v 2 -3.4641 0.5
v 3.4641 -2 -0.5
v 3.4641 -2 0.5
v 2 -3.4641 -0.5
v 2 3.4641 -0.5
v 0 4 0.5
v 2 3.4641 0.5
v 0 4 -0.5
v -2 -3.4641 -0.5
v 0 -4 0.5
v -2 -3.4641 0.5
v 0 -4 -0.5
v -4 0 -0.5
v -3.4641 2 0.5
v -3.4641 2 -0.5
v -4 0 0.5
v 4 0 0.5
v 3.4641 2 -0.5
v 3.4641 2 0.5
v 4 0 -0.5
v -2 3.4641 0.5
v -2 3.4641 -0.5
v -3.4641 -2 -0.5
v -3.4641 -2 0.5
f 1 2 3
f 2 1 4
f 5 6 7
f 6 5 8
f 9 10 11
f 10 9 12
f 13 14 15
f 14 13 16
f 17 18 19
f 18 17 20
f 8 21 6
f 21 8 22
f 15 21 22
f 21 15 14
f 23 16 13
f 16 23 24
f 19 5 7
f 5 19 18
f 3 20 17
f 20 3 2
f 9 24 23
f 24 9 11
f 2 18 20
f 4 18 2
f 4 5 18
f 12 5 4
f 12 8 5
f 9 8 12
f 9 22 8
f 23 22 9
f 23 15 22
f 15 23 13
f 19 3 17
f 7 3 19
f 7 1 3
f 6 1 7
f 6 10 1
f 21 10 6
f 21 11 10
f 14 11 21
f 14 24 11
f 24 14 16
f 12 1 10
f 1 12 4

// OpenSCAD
//
// head.scad

// Copyright (C) 2024 John Mettraux jmettraux@gmail.com
//
// This work is licensed under the
// Creative Commons Attribution 4.0 International License.
//
// https://creativecommons.org/licenses/by/4.0/


h = 5; // height unit, 5mm
br = 1.7; // magnet ball radius
o2 = 0.2; // some kind of step

r = 20 / 2;
t = r / cos(30);
rr = r / 10;
echo("r", r, "t", t);

module sphe() { sphere(r=rr, $fn=12); }
module balcyl() { cylinder(r=br + 2 * o2, h=br * 2 + o2, center=true, $fn=36); }

module hex(key, edge=false) {

  difference() {

    translate([ 0, 0, h * -0.5 ])
      hull()
        for (a = [ 0 : 60 : 300 ]) {
          rotate([ 0, 0, a ]) {
            translate([ 0, t - rr, h - rr ]) sphe();
            translate([ 0, t - rr, rr ]) sphe();
          }
        }

    if (edge) for (a = [ 30 : 60 : 330 ]) {
      #rotate([ 0, 0, a ]) translate([ 0, r - br - 4 * o2, 0 ]) balcyl();
    }
  }

  //#translate([ 0, 0, h * 2 ]) linear_extrude(0.4) text(key, size=8);
}

//hex(true);
//translate([ 2 * r, 0, 0 ]) hex(true);

module int_hex(hh) {
  translate([ 0, 0, -hh ])
    rotate([ 0, 0, 30 ])
      cylinder(r=t - 2 * o2, h=2 * hh, $fn=6);
}
module int_cyl(ch) {
  translate([ 0, 0, -ch ])
    cylinder(r=r - 5 * o2, h=2 * ch, $fn=24);
}

module blob(xyrs, bh, shape="hex") {
  intersection() {
    if (shape == "hex") int_hex(bh); else int_cyl(bh);
    for (i = [ 0 : len(xyrs) - 1 ]) {
      a = xyrs[i];
      b = xyrs[i + 1];
      hull() {
        translate([ a.x, a.y, 0 ])
          cylinder(h=bh, r=a.z, center=true, $fn=12);
        if (b) translate([ b.x, b.y, 0 ])
          cylinder(h=bh, r=b.z, center=true, $fn=12);
      }
    }
  }
}

module sea_hex(key, edge) {
  hex(key, edge);
  translate([ 0, 0, h / 2 ]) color("blue") int_hex(2 * o2);
}

dx = r * 2;
dy = 1.5 * t + o2;
dx2 = dx / 2;

//        a0  b0  c0  d0
//
//      a1  b1  c1  d1  e1
//
//    a2  b2  c2  d2  e2  f2
//
//  a3  b3  c3  d3  e3  f3  g3
//
//    b4  c4  d4  e4  f4  g4
//
//      c5  d5  e5  f5  g5
//
//        d6  e6  f6  g6

// --- TEST ---

blob([ [ 0, 0, r * 0.4 ] ], 1.0, "hex");
